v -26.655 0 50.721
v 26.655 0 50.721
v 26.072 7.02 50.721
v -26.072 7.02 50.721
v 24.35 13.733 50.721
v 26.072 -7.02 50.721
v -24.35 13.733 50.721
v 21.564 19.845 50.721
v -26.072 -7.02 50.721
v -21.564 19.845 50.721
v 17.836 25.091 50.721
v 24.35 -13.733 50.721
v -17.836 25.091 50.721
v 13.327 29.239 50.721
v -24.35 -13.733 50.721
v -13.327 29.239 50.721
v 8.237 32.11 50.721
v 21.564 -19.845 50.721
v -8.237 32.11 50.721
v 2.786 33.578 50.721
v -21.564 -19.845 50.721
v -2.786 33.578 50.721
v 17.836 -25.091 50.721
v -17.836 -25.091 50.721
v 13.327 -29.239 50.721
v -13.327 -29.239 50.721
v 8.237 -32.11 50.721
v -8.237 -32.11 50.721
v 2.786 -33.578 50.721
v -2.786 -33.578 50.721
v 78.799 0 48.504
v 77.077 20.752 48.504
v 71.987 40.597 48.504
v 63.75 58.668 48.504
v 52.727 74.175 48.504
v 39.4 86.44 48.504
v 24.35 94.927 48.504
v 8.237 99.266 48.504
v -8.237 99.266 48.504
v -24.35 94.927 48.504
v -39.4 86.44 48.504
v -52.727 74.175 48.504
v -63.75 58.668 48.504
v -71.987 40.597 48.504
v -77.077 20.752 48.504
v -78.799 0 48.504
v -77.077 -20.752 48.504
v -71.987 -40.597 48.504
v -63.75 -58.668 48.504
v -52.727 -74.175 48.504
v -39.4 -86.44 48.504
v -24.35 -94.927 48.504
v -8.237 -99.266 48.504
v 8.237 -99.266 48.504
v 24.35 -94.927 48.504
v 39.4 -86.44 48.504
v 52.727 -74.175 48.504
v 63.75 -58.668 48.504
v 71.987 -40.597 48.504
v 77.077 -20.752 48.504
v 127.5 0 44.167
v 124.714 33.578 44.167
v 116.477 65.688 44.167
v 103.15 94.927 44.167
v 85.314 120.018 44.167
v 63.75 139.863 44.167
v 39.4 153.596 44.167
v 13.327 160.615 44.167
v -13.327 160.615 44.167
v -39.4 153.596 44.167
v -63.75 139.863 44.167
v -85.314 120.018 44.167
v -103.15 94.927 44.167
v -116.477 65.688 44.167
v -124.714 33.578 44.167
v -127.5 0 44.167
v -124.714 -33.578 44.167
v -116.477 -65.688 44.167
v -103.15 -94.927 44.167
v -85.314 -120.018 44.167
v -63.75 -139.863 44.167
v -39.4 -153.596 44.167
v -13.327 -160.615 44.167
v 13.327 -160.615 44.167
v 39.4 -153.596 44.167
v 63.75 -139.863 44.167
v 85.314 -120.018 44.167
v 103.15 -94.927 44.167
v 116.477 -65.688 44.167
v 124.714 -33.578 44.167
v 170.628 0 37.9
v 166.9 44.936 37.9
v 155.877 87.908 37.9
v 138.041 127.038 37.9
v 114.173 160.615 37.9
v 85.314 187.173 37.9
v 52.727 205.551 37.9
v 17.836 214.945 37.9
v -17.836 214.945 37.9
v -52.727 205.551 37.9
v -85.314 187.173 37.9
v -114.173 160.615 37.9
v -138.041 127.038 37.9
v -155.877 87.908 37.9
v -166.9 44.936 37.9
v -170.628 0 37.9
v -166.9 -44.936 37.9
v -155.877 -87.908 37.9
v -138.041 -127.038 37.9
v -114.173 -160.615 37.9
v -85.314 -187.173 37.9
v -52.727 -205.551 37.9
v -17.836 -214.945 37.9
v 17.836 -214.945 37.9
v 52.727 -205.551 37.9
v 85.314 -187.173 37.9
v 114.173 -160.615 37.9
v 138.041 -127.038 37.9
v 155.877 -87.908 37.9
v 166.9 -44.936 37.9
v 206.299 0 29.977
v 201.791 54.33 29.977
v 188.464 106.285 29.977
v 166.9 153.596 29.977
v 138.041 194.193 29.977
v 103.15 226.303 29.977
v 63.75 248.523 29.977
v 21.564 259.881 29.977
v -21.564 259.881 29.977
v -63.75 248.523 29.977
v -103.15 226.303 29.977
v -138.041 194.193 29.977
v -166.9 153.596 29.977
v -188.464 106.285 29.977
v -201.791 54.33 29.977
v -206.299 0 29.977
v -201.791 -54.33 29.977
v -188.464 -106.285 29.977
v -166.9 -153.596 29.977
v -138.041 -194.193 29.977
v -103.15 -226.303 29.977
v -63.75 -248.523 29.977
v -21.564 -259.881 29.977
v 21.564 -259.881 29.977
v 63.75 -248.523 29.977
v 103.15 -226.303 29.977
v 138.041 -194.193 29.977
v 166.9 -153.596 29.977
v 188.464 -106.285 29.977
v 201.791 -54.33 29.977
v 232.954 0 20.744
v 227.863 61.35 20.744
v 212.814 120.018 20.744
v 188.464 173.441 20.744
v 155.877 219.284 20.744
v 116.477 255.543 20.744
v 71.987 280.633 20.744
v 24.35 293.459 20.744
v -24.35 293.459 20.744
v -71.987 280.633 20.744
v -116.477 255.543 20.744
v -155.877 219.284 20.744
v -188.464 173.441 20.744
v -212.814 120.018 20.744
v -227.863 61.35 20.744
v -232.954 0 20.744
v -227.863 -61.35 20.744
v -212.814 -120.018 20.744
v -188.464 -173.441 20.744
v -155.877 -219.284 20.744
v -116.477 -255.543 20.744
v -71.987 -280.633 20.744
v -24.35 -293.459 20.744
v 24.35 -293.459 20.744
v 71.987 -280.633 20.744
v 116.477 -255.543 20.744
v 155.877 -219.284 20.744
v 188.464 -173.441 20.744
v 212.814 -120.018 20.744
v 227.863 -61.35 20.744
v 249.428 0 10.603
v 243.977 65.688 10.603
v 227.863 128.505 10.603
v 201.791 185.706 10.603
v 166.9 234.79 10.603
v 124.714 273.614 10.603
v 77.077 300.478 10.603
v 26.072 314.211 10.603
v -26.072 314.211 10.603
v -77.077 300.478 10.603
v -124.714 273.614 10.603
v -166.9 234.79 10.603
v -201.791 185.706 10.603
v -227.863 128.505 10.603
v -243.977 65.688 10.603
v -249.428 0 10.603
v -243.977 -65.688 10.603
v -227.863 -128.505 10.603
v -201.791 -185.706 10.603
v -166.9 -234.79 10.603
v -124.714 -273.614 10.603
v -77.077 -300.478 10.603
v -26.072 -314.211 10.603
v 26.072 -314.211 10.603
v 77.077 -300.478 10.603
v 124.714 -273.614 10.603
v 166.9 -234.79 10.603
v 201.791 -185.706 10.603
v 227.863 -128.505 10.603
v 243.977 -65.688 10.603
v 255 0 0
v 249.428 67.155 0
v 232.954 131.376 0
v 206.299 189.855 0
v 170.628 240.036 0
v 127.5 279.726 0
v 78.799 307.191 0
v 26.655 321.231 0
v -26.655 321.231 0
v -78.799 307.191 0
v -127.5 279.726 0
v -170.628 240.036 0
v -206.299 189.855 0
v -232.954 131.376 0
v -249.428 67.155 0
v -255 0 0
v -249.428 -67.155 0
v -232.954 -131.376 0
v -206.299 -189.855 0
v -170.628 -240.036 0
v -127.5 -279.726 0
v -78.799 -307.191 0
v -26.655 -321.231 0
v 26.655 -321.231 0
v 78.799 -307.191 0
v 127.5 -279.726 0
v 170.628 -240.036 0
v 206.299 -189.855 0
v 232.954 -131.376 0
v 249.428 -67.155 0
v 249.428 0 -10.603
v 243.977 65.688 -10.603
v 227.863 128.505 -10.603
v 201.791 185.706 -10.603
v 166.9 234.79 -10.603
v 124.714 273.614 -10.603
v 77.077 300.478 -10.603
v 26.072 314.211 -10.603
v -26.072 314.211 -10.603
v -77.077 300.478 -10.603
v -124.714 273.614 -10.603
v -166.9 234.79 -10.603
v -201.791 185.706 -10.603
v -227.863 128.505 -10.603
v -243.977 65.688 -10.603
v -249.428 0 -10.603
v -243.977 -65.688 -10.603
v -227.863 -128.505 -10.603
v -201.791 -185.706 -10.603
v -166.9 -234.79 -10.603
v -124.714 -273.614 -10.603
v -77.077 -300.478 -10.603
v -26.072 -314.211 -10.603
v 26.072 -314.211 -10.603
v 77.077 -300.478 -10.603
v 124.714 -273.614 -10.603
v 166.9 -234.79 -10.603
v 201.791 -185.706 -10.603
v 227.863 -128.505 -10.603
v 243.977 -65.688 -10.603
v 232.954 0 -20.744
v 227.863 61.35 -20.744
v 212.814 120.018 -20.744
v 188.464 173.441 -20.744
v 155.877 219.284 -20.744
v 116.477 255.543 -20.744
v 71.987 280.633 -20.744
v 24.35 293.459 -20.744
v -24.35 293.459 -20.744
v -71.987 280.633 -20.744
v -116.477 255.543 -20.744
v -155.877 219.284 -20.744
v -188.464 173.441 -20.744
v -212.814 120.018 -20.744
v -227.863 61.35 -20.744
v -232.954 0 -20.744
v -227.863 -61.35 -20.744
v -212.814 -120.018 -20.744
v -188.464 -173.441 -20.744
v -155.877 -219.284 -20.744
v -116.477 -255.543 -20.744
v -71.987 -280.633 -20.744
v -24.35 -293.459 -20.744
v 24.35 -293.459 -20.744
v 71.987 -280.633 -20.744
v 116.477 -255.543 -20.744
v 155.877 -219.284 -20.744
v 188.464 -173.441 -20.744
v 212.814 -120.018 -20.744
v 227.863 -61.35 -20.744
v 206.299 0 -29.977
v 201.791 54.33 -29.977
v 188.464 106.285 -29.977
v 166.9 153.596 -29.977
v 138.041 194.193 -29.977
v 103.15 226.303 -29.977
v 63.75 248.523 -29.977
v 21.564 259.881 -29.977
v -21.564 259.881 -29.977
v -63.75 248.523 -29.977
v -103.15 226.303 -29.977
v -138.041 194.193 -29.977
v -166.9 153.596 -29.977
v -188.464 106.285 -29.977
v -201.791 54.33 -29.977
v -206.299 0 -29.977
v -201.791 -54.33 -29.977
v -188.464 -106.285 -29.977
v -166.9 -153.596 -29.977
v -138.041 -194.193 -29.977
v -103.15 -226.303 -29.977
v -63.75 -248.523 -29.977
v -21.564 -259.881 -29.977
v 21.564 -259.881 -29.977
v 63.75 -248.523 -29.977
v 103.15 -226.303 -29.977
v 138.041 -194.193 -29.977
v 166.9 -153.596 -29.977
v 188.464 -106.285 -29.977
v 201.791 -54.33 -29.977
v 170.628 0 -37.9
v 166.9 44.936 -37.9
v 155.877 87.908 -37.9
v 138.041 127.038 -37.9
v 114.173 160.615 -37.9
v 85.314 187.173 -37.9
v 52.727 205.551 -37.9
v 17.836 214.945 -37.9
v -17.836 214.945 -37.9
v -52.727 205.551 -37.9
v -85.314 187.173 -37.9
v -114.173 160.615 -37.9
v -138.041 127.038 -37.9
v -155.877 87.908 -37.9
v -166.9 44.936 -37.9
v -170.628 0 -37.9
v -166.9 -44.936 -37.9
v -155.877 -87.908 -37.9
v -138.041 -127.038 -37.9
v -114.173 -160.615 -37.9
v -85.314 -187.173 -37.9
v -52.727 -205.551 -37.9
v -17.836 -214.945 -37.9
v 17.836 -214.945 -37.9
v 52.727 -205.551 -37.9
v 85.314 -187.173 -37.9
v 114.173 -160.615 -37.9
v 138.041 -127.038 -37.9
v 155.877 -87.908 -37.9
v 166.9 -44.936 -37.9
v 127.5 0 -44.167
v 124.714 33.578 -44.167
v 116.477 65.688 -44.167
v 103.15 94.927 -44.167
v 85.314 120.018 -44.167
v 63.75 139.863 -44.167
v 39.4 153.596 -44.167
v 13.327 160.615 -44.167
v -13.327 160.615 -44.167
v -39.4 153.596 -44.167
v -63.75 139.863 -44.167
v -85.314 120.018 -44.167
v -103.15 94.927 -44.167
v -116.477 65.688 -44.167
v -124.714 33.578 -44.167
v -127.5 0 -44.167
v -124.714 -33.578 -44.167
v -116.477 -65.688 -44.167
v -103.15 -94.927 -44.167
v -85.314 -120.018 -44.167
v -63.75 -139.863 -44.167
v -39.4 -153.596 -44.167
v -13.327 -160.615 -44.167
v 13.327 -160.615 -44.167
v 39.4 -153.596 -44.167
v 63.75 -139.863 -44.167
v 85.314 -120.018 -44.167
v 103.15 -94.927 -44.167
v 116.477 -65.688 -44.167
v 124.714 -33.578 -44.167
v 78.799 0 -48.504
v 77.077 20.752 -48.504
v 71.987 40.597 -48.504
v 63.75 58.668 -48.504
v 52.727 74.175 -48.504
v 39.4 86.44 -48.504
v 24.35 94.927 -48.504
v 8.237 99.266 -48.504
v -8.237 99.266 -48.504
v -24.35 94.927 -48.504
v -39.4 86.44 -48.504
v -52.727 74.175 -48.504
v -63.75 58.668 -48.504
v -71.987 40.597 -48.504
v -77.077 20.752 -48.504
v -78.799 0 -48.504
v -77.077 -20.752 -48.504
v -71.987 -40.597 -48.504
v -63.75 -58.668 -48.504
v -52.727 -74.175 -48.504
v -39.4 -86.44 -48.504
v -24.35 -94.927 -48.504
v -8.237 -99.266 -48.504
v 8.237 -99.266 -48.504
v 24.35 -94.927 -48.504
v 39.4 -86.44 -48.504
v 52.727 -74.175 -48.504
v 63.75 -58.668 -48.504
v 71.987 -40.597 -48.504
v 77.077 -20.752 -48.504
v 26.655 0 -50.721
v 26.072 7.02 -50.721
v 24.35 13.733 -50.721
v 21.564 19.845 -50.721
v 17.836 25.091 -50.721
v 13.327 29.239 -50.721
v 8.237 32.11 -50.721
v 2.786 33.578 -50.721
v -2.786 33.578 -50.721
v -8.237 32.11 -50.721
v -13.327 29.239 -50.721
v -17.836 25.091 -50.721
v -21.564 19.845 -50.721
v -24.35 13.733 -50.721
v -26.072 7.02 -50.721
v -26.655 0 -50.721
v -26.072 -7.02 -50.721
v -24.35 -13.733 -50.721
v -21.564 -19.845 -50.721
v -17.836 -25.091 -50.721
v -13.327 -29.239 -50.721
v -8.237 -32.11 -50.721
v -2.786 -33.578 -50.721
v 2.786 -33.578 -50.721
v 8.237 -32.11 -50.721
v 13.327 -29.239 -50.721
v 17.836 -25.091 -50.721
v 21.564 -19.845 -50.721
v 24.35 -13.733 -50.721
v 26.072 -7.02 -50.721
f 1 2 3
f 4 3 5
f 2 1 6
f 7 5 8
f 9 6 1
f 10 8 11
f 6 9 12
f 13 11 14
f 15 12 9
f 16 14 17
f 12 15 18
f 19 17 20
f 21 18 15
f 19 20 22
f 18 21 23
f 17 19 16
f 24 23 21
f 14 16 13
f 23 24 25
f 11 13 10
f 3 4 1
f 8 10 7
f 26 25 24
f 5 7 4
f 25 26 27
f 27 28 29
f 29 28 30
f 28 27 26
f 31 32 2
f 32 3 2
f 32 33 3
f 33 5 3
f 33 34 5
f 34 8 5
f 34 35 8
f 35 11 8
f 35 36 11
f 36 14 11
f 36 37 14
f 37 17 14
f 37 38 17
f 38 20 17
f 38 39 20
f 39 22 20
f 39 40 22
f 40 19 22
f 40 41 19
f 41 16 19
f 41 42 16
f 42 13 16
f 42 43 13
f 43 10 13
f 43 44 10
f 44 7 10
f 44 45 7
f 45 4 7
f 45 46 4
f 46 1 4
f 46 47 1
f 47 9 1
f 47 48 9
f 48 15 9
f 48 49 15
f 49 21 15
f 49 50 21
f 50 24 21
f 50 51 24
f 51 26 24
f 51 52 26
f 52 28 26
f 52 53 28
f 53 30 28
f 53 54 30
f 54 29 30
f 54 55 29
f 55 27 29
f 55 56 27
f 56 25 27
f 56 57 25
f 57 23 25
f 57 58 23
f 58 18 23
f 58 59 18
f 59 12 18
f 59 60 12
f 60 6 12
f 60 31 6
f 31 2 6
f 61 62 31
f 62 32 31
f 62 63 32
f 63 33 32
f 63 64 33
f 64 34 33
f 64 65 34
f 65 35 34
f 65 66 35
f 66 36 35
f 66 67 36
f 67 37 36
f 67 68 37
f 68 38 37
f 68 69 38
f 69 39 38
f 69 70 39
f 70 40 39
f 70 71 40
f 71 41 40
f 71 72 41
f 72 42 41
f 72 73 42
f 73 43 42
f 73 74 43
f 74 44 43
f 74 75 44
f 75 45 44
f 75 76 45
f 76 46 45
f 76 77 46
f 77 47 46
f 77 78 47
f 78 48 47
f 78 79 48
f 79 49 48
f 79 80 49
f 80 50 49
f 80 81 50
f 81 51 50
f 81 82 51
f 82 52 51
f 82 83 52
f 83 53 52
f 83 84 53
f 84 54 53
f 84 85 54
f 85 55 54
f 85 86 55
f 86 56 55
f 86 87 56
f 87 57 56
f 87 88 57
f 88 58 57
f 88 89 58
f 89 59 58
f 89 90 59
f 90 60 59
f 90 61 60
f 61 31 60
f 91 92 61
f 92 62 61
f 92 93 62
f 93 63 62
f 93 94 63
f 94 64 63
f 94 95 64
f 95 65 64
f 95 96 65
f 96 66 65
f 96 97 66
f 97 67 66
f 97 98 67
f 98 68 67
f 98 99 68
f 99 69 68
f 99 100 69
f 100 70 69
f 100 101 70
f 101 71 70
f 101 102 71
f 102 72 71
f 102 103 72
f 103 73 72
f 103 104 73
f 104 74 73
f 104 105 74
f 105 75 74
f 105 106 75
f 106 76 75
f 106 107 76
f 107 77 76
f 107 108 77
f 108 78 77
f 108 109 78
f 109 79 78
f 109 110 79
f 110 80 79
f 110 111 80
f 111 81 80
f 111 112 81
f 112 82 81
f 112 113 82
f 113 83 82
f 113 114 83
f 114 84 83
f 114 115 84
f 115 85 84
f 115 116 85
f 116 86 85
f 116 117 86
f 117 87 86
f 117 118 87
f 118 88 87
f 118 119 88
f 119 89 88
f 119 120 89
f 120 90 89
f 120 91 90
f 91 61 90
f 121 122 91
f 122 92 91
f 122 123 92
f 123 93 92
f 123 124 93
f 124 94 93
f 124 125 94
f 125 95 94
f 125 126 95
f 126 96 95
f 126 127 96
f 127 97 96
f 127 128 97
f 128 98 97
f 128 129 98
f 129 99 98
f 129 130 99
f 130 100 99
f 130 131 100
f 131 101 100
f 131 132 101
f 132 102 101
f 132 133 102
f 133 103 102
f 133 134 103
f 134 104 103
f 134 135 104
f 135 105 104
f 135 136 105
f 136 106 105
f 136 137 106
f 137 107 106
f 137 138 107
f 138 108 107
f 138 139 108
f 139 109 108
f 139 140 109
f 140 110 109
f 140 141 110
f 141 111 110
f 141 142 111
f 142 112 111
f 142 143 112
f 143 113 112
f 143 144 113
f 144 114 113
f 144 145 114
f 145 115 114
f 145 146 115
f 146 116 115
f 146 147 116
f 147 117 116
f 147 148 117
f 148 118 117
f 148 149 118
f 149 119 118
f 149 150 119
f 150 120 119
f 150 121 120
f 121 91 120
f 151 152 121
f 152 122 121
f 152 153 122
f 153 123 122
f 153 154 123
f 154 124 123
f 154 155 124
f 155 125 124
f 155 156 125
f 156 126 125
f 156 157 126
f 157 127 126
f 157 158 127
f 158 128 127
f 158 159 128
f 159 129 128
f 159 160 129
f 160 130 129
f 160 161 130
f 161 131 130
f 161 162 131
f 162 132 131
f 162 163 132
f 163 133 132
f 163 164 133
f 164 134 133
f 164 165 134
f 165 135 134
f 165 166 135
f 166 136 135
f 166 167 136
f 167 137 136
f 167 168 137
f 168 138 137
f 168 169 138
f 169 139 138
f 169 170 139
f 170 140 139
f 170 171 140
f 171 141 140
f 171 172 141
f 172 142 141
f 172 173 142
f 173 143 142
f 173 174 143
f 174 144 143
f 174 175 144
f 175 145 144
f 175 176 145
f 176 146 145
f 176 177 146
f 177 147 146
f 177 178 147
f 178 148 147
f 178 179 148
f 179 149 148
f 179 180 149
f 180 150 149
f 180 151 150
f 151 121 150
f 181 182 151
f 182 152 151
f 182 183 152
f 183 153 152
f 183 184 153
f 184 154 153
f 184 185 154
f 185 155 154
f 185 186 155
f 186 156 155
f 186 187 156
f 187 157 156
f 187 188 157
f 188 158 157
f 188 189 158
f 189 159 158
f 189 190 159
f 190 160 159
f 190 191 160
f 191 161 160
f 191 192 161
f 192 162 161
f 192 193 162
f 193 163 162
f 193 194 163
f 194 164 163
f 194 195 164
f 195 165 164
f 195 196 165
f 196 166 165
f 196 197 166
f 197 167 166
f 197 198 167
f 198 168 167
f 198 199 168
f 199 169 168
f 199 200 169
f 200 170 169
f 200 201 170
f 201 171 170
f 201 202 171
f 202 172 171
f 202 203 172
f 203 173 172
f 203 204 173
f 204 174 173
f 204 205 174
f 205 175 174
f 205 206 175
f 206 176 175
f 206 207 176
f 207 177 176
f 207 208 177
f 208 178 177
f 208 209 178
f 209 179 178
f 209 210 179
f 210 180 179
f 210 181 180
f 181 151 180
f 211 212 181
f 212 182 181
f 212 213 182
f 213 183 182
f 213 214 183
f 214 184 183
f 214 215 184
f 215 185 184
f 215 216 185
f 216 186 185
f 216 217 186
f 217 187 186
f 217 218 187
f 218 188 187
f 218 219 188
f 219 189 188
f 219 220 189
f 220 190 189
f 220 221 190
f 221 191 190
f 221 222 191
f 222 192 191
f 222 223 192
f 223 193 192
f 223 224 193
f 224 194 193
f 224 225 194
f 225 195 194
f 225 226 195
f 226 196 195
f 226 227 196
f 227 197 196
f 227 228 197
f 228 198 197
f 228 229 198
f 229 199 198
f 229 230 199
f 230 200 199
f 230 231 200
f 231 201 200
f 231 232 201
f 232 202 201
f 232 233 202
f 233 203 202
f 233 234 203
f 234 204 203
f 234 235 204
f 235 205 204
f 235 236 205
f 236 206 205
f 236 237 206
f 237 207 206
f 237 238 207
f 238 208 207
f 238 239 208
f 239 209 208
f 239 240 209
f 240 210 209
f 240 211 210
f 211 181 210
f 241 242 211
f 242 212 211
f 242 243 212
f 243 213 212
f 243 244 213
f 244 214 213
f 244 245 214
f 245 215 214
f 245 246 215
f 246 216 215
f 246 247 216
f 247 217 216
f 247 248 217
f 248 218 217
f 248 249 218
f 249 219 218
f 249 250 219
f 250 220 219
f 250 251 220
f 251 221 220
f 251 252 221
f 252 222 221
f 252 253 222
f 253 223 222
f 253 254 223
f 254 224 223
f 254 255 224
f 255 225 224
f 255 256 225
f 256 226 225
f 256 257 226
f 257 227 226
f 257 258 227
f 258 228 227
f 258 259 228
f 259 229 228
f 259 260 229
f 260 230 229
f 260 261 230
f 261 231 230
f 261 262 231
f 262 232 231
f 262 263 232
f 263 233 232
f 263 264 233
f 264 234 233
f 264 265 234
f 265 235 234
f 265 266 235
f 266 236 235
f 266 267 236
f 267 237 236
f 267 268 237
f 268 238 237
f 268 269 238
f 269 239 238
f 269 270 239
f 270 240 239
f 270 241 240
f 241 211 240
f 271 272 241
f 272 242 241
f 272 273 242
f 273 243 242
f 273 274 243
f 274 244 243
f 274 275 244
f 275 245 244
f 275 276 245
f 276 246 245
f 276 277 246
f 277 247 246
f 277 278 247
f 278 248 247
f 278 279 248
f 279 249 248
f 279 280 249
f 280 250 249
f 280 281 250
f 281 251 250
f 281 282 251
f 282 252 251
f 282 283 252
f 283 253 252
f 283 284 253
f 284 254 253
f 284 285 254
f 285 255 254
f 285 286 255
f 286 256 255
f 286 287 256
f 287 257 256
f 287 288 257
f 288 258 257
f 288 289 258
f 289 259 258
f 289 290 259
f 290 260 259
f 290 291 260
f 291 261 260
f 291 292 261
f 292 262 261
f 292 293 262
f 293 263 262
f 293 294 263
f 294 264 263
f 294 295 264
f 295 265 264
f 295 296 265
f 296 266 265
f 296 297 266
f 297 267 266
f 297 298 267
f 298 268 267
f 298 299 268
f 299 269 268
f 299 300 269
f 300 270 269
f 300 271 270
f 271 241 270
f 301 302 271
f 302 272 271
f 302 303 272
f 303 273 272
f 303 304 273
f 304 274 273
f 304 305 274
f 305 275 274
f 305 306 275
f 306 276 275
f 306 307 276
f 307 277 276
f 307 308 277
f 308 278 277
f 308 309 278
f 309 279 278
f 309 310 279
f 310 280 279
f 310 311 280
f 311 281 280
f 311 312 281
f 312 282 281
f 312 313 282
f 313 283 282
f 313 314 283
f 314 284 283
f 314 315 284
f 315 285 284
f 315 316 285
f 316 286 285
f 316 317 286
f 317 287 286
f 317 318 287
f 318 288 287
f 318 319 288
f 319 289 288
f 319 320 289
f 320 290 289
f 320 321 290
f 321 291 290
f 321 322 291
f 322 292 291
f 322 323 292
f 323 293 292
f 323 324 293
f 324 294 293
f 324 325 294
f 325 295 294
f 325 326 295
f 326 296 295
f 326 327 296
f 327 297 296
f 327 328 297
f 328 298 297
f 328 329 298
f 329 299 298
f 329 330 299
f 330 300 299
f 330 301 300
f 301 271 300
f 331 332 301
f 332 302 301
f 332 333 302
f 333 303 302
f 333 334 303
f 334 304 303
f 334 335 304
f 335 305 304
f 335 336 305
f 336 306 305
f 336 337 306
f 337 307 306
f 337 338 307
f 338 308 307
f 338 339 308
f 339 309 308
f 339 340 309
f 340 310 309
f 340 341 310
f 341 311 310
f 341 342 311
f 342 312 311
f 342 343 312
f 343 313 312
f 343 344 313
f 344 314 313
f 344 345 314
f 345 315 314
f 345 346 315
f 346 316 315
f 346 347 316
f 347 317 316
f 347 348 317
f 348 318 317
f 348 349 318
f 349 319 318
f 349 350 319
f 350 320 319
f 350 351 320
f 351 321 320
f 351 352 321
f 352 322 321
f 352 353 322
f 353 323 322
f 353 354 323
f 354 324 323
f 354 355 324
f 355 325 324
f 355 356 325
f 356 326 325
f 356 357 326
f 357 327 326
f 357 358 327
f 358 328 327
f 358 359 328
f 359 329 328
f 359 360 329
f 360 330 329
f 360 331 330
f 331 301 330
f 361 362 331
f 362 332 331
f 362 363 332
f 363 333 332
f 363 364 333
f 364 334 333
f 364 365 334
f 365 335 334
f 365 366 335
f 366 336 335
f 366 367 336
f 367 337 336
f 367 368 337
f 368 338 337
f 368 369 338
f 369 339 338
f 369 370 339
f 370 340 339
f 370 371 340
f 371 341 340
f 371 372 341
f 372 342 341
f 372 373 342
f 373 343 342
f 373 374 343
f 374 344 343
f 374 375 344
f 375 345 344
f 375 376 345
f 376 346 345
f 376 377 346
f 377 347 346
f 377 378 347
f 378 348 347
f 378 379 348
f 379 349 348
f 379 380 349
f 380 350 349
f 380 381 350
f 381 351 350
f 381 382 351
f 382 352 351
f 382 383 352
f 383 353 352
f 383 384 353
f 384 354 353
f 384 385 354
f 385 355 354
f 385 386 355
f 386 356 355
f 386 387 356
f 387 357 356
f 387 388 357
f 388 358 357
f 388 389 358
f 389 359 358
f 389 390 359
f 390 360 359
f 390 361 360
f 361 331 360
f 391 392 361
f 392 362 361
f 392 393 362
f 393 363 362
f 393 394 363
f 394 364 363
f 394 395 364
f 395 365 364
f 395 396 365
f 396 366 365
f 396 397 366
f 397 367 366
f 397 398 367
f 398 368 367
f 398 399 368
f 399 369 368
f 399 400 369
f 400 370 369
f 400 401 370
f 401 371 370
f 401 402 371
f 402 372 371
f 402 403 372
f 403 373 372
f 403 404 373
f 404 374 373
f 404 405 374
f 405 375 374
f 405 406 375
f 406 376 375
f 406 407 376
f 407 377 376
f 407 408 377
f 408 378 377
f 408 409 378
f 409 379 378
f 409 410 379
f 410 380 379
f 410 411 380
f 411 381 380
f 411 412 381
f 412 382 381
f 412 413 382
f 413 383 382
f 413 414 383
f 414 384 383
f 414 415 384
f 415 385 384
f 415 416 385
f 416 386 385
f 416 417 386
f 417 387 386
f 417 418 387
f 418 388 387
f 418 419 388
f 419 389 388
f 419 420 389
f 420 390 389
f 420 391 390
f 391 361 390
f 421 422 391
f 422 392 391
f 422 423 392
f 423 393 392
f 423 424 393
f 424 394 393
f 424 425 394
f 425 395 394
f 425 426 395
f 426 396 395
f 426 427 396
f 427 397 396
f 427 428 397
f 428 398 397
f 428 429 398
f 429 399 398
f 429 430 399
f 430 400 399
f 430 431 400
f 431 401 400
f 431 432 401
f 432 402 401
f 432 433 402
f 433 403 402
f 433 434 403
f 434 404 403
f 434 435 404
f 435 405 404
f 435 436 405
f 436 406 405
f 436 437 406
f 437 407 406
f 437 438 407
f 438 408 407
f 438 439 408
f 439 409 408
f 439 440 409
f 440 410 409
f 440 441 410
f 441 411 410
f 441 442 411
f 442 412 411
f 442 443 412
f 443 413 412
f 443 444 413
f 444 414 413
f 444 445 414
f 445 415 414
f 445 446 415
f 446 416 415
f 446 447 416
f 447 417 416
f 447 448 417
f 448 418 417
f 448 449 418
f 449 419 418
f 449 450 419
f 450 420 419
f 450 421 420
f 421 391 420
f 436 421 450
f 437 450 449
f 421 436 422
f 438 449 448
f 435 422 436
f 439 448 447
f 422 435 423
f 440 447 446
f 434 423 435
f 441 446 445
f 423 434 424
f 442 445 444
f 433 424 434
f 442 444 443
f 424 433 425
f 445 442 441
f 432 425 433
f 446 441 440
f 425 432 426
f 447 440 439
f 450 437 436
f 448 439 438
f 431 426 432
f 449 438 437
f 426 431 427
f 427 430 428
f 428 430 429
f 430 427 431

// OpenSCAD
// Generated by SolidPython 1.0.1 on 2020-07-29 00:46:52


scale(v = [15, 19, 3]) {
	sphere(r = 17);
}
/***********************************************
*********      SolidPython code:      **********
************************************************
 
# import packages: SolidPython
from solid import *
from solid.utils import *
from itertools import chain, combinations, permutations


class Resize:

    def __init__(self, scad_file):
        self.scad_file = scad_file
        #self.scad_file = import_scad(scad_file)
        # cone/cylinder param:
        self.r1 = 0
        self.r2 = 0
        self.h = 0
        # rectangular prism param:
        self.w = 0
        self.l = 0
        # ellipse param:
        self.r = 0

    # import OpenScad code (file name corresponds to shape)


    # classify shape + parameters
    def assign(self, param1, param2, param3):
        if self.scad_file == 'cone.scad':
            self.r1 = param1
            self.r2 = param2
            self.h = param3
        elif self.scad_file == 'cylinder.scad':
            self.r1 = param1
            self.r2 = param2
            self.h = param3
        elif self.scad_file == 'rectangularPrism.scad':
            self.h = param1
            self.l = param2
            self.w = param3
        else:
            self.r = param1
            self.h = param2

    # resize parameters
    def iterate(self):
        x = range(3, 20, 2)
        i = 1
        if self.scad_file == 'cone.scad':
            tempList = list(permutations(x, 2))
            for temp in tempList:
                param1 = temp[0]
                param2 = temp[1]
                filepath = 'produced_scad_files/' + 'cone' + str(param1) + '_' + str(param2) + '_' + '.scad'
                scad_render_to_file(cylinder(h=param1, r1=param2, r2=0), filepath)

        elif self.scad_file == 'cylinder.scad':
            tempList = list(permutations(x, 3))
            for temp in tempList:
                param1 = temp[0]
                param2 = temp[1]
                filepath = 'produced_scad_files/' + 'cylinder' + str(param1) + '_' + str(param2) + '_' + '.scad'
                scad_render_to_file(cylinder(h=param1, r1=param2, r2=param2), filepath)

        elif self.scad_file == 'rectangularPrism.scad':
            tempList = list(permutations(x, 3))
            for temp in tempList:
                param1 = temp[0]
                param2 = temp[1]
                param3 = temp[2]
                filepath = 'produced_scad_files/' + 'rectangularPrism' + str(param1) + '_' + str(param2) + '_' + str(
                    param3) + '.scad'
                scad_render_to_file(cube(size=(param1, param2, param3)), filepath)

        elif self.scad_file == 'ellipse.scad':
            tempList = list(permutations(x, 4))
            for temp in tempList:
                param1 = temp[0]
                param2 = temp[1]
                param3 = temp[2]
                param4 = temp[3]
                filepath = 'produced_scad_files/' + 'ellipse' + str(param1) + '_' + str(param2) + '_' + str(param3) + '_' + str(param4) + '.scad'
                scad_render_to_file(scale([param1, param2, param3])(sphere(r=param4)), filepath)

    def render_to_scadfile(self):
        scad_render_to_file(scad, 'example.scad') 
 
************************************************/
